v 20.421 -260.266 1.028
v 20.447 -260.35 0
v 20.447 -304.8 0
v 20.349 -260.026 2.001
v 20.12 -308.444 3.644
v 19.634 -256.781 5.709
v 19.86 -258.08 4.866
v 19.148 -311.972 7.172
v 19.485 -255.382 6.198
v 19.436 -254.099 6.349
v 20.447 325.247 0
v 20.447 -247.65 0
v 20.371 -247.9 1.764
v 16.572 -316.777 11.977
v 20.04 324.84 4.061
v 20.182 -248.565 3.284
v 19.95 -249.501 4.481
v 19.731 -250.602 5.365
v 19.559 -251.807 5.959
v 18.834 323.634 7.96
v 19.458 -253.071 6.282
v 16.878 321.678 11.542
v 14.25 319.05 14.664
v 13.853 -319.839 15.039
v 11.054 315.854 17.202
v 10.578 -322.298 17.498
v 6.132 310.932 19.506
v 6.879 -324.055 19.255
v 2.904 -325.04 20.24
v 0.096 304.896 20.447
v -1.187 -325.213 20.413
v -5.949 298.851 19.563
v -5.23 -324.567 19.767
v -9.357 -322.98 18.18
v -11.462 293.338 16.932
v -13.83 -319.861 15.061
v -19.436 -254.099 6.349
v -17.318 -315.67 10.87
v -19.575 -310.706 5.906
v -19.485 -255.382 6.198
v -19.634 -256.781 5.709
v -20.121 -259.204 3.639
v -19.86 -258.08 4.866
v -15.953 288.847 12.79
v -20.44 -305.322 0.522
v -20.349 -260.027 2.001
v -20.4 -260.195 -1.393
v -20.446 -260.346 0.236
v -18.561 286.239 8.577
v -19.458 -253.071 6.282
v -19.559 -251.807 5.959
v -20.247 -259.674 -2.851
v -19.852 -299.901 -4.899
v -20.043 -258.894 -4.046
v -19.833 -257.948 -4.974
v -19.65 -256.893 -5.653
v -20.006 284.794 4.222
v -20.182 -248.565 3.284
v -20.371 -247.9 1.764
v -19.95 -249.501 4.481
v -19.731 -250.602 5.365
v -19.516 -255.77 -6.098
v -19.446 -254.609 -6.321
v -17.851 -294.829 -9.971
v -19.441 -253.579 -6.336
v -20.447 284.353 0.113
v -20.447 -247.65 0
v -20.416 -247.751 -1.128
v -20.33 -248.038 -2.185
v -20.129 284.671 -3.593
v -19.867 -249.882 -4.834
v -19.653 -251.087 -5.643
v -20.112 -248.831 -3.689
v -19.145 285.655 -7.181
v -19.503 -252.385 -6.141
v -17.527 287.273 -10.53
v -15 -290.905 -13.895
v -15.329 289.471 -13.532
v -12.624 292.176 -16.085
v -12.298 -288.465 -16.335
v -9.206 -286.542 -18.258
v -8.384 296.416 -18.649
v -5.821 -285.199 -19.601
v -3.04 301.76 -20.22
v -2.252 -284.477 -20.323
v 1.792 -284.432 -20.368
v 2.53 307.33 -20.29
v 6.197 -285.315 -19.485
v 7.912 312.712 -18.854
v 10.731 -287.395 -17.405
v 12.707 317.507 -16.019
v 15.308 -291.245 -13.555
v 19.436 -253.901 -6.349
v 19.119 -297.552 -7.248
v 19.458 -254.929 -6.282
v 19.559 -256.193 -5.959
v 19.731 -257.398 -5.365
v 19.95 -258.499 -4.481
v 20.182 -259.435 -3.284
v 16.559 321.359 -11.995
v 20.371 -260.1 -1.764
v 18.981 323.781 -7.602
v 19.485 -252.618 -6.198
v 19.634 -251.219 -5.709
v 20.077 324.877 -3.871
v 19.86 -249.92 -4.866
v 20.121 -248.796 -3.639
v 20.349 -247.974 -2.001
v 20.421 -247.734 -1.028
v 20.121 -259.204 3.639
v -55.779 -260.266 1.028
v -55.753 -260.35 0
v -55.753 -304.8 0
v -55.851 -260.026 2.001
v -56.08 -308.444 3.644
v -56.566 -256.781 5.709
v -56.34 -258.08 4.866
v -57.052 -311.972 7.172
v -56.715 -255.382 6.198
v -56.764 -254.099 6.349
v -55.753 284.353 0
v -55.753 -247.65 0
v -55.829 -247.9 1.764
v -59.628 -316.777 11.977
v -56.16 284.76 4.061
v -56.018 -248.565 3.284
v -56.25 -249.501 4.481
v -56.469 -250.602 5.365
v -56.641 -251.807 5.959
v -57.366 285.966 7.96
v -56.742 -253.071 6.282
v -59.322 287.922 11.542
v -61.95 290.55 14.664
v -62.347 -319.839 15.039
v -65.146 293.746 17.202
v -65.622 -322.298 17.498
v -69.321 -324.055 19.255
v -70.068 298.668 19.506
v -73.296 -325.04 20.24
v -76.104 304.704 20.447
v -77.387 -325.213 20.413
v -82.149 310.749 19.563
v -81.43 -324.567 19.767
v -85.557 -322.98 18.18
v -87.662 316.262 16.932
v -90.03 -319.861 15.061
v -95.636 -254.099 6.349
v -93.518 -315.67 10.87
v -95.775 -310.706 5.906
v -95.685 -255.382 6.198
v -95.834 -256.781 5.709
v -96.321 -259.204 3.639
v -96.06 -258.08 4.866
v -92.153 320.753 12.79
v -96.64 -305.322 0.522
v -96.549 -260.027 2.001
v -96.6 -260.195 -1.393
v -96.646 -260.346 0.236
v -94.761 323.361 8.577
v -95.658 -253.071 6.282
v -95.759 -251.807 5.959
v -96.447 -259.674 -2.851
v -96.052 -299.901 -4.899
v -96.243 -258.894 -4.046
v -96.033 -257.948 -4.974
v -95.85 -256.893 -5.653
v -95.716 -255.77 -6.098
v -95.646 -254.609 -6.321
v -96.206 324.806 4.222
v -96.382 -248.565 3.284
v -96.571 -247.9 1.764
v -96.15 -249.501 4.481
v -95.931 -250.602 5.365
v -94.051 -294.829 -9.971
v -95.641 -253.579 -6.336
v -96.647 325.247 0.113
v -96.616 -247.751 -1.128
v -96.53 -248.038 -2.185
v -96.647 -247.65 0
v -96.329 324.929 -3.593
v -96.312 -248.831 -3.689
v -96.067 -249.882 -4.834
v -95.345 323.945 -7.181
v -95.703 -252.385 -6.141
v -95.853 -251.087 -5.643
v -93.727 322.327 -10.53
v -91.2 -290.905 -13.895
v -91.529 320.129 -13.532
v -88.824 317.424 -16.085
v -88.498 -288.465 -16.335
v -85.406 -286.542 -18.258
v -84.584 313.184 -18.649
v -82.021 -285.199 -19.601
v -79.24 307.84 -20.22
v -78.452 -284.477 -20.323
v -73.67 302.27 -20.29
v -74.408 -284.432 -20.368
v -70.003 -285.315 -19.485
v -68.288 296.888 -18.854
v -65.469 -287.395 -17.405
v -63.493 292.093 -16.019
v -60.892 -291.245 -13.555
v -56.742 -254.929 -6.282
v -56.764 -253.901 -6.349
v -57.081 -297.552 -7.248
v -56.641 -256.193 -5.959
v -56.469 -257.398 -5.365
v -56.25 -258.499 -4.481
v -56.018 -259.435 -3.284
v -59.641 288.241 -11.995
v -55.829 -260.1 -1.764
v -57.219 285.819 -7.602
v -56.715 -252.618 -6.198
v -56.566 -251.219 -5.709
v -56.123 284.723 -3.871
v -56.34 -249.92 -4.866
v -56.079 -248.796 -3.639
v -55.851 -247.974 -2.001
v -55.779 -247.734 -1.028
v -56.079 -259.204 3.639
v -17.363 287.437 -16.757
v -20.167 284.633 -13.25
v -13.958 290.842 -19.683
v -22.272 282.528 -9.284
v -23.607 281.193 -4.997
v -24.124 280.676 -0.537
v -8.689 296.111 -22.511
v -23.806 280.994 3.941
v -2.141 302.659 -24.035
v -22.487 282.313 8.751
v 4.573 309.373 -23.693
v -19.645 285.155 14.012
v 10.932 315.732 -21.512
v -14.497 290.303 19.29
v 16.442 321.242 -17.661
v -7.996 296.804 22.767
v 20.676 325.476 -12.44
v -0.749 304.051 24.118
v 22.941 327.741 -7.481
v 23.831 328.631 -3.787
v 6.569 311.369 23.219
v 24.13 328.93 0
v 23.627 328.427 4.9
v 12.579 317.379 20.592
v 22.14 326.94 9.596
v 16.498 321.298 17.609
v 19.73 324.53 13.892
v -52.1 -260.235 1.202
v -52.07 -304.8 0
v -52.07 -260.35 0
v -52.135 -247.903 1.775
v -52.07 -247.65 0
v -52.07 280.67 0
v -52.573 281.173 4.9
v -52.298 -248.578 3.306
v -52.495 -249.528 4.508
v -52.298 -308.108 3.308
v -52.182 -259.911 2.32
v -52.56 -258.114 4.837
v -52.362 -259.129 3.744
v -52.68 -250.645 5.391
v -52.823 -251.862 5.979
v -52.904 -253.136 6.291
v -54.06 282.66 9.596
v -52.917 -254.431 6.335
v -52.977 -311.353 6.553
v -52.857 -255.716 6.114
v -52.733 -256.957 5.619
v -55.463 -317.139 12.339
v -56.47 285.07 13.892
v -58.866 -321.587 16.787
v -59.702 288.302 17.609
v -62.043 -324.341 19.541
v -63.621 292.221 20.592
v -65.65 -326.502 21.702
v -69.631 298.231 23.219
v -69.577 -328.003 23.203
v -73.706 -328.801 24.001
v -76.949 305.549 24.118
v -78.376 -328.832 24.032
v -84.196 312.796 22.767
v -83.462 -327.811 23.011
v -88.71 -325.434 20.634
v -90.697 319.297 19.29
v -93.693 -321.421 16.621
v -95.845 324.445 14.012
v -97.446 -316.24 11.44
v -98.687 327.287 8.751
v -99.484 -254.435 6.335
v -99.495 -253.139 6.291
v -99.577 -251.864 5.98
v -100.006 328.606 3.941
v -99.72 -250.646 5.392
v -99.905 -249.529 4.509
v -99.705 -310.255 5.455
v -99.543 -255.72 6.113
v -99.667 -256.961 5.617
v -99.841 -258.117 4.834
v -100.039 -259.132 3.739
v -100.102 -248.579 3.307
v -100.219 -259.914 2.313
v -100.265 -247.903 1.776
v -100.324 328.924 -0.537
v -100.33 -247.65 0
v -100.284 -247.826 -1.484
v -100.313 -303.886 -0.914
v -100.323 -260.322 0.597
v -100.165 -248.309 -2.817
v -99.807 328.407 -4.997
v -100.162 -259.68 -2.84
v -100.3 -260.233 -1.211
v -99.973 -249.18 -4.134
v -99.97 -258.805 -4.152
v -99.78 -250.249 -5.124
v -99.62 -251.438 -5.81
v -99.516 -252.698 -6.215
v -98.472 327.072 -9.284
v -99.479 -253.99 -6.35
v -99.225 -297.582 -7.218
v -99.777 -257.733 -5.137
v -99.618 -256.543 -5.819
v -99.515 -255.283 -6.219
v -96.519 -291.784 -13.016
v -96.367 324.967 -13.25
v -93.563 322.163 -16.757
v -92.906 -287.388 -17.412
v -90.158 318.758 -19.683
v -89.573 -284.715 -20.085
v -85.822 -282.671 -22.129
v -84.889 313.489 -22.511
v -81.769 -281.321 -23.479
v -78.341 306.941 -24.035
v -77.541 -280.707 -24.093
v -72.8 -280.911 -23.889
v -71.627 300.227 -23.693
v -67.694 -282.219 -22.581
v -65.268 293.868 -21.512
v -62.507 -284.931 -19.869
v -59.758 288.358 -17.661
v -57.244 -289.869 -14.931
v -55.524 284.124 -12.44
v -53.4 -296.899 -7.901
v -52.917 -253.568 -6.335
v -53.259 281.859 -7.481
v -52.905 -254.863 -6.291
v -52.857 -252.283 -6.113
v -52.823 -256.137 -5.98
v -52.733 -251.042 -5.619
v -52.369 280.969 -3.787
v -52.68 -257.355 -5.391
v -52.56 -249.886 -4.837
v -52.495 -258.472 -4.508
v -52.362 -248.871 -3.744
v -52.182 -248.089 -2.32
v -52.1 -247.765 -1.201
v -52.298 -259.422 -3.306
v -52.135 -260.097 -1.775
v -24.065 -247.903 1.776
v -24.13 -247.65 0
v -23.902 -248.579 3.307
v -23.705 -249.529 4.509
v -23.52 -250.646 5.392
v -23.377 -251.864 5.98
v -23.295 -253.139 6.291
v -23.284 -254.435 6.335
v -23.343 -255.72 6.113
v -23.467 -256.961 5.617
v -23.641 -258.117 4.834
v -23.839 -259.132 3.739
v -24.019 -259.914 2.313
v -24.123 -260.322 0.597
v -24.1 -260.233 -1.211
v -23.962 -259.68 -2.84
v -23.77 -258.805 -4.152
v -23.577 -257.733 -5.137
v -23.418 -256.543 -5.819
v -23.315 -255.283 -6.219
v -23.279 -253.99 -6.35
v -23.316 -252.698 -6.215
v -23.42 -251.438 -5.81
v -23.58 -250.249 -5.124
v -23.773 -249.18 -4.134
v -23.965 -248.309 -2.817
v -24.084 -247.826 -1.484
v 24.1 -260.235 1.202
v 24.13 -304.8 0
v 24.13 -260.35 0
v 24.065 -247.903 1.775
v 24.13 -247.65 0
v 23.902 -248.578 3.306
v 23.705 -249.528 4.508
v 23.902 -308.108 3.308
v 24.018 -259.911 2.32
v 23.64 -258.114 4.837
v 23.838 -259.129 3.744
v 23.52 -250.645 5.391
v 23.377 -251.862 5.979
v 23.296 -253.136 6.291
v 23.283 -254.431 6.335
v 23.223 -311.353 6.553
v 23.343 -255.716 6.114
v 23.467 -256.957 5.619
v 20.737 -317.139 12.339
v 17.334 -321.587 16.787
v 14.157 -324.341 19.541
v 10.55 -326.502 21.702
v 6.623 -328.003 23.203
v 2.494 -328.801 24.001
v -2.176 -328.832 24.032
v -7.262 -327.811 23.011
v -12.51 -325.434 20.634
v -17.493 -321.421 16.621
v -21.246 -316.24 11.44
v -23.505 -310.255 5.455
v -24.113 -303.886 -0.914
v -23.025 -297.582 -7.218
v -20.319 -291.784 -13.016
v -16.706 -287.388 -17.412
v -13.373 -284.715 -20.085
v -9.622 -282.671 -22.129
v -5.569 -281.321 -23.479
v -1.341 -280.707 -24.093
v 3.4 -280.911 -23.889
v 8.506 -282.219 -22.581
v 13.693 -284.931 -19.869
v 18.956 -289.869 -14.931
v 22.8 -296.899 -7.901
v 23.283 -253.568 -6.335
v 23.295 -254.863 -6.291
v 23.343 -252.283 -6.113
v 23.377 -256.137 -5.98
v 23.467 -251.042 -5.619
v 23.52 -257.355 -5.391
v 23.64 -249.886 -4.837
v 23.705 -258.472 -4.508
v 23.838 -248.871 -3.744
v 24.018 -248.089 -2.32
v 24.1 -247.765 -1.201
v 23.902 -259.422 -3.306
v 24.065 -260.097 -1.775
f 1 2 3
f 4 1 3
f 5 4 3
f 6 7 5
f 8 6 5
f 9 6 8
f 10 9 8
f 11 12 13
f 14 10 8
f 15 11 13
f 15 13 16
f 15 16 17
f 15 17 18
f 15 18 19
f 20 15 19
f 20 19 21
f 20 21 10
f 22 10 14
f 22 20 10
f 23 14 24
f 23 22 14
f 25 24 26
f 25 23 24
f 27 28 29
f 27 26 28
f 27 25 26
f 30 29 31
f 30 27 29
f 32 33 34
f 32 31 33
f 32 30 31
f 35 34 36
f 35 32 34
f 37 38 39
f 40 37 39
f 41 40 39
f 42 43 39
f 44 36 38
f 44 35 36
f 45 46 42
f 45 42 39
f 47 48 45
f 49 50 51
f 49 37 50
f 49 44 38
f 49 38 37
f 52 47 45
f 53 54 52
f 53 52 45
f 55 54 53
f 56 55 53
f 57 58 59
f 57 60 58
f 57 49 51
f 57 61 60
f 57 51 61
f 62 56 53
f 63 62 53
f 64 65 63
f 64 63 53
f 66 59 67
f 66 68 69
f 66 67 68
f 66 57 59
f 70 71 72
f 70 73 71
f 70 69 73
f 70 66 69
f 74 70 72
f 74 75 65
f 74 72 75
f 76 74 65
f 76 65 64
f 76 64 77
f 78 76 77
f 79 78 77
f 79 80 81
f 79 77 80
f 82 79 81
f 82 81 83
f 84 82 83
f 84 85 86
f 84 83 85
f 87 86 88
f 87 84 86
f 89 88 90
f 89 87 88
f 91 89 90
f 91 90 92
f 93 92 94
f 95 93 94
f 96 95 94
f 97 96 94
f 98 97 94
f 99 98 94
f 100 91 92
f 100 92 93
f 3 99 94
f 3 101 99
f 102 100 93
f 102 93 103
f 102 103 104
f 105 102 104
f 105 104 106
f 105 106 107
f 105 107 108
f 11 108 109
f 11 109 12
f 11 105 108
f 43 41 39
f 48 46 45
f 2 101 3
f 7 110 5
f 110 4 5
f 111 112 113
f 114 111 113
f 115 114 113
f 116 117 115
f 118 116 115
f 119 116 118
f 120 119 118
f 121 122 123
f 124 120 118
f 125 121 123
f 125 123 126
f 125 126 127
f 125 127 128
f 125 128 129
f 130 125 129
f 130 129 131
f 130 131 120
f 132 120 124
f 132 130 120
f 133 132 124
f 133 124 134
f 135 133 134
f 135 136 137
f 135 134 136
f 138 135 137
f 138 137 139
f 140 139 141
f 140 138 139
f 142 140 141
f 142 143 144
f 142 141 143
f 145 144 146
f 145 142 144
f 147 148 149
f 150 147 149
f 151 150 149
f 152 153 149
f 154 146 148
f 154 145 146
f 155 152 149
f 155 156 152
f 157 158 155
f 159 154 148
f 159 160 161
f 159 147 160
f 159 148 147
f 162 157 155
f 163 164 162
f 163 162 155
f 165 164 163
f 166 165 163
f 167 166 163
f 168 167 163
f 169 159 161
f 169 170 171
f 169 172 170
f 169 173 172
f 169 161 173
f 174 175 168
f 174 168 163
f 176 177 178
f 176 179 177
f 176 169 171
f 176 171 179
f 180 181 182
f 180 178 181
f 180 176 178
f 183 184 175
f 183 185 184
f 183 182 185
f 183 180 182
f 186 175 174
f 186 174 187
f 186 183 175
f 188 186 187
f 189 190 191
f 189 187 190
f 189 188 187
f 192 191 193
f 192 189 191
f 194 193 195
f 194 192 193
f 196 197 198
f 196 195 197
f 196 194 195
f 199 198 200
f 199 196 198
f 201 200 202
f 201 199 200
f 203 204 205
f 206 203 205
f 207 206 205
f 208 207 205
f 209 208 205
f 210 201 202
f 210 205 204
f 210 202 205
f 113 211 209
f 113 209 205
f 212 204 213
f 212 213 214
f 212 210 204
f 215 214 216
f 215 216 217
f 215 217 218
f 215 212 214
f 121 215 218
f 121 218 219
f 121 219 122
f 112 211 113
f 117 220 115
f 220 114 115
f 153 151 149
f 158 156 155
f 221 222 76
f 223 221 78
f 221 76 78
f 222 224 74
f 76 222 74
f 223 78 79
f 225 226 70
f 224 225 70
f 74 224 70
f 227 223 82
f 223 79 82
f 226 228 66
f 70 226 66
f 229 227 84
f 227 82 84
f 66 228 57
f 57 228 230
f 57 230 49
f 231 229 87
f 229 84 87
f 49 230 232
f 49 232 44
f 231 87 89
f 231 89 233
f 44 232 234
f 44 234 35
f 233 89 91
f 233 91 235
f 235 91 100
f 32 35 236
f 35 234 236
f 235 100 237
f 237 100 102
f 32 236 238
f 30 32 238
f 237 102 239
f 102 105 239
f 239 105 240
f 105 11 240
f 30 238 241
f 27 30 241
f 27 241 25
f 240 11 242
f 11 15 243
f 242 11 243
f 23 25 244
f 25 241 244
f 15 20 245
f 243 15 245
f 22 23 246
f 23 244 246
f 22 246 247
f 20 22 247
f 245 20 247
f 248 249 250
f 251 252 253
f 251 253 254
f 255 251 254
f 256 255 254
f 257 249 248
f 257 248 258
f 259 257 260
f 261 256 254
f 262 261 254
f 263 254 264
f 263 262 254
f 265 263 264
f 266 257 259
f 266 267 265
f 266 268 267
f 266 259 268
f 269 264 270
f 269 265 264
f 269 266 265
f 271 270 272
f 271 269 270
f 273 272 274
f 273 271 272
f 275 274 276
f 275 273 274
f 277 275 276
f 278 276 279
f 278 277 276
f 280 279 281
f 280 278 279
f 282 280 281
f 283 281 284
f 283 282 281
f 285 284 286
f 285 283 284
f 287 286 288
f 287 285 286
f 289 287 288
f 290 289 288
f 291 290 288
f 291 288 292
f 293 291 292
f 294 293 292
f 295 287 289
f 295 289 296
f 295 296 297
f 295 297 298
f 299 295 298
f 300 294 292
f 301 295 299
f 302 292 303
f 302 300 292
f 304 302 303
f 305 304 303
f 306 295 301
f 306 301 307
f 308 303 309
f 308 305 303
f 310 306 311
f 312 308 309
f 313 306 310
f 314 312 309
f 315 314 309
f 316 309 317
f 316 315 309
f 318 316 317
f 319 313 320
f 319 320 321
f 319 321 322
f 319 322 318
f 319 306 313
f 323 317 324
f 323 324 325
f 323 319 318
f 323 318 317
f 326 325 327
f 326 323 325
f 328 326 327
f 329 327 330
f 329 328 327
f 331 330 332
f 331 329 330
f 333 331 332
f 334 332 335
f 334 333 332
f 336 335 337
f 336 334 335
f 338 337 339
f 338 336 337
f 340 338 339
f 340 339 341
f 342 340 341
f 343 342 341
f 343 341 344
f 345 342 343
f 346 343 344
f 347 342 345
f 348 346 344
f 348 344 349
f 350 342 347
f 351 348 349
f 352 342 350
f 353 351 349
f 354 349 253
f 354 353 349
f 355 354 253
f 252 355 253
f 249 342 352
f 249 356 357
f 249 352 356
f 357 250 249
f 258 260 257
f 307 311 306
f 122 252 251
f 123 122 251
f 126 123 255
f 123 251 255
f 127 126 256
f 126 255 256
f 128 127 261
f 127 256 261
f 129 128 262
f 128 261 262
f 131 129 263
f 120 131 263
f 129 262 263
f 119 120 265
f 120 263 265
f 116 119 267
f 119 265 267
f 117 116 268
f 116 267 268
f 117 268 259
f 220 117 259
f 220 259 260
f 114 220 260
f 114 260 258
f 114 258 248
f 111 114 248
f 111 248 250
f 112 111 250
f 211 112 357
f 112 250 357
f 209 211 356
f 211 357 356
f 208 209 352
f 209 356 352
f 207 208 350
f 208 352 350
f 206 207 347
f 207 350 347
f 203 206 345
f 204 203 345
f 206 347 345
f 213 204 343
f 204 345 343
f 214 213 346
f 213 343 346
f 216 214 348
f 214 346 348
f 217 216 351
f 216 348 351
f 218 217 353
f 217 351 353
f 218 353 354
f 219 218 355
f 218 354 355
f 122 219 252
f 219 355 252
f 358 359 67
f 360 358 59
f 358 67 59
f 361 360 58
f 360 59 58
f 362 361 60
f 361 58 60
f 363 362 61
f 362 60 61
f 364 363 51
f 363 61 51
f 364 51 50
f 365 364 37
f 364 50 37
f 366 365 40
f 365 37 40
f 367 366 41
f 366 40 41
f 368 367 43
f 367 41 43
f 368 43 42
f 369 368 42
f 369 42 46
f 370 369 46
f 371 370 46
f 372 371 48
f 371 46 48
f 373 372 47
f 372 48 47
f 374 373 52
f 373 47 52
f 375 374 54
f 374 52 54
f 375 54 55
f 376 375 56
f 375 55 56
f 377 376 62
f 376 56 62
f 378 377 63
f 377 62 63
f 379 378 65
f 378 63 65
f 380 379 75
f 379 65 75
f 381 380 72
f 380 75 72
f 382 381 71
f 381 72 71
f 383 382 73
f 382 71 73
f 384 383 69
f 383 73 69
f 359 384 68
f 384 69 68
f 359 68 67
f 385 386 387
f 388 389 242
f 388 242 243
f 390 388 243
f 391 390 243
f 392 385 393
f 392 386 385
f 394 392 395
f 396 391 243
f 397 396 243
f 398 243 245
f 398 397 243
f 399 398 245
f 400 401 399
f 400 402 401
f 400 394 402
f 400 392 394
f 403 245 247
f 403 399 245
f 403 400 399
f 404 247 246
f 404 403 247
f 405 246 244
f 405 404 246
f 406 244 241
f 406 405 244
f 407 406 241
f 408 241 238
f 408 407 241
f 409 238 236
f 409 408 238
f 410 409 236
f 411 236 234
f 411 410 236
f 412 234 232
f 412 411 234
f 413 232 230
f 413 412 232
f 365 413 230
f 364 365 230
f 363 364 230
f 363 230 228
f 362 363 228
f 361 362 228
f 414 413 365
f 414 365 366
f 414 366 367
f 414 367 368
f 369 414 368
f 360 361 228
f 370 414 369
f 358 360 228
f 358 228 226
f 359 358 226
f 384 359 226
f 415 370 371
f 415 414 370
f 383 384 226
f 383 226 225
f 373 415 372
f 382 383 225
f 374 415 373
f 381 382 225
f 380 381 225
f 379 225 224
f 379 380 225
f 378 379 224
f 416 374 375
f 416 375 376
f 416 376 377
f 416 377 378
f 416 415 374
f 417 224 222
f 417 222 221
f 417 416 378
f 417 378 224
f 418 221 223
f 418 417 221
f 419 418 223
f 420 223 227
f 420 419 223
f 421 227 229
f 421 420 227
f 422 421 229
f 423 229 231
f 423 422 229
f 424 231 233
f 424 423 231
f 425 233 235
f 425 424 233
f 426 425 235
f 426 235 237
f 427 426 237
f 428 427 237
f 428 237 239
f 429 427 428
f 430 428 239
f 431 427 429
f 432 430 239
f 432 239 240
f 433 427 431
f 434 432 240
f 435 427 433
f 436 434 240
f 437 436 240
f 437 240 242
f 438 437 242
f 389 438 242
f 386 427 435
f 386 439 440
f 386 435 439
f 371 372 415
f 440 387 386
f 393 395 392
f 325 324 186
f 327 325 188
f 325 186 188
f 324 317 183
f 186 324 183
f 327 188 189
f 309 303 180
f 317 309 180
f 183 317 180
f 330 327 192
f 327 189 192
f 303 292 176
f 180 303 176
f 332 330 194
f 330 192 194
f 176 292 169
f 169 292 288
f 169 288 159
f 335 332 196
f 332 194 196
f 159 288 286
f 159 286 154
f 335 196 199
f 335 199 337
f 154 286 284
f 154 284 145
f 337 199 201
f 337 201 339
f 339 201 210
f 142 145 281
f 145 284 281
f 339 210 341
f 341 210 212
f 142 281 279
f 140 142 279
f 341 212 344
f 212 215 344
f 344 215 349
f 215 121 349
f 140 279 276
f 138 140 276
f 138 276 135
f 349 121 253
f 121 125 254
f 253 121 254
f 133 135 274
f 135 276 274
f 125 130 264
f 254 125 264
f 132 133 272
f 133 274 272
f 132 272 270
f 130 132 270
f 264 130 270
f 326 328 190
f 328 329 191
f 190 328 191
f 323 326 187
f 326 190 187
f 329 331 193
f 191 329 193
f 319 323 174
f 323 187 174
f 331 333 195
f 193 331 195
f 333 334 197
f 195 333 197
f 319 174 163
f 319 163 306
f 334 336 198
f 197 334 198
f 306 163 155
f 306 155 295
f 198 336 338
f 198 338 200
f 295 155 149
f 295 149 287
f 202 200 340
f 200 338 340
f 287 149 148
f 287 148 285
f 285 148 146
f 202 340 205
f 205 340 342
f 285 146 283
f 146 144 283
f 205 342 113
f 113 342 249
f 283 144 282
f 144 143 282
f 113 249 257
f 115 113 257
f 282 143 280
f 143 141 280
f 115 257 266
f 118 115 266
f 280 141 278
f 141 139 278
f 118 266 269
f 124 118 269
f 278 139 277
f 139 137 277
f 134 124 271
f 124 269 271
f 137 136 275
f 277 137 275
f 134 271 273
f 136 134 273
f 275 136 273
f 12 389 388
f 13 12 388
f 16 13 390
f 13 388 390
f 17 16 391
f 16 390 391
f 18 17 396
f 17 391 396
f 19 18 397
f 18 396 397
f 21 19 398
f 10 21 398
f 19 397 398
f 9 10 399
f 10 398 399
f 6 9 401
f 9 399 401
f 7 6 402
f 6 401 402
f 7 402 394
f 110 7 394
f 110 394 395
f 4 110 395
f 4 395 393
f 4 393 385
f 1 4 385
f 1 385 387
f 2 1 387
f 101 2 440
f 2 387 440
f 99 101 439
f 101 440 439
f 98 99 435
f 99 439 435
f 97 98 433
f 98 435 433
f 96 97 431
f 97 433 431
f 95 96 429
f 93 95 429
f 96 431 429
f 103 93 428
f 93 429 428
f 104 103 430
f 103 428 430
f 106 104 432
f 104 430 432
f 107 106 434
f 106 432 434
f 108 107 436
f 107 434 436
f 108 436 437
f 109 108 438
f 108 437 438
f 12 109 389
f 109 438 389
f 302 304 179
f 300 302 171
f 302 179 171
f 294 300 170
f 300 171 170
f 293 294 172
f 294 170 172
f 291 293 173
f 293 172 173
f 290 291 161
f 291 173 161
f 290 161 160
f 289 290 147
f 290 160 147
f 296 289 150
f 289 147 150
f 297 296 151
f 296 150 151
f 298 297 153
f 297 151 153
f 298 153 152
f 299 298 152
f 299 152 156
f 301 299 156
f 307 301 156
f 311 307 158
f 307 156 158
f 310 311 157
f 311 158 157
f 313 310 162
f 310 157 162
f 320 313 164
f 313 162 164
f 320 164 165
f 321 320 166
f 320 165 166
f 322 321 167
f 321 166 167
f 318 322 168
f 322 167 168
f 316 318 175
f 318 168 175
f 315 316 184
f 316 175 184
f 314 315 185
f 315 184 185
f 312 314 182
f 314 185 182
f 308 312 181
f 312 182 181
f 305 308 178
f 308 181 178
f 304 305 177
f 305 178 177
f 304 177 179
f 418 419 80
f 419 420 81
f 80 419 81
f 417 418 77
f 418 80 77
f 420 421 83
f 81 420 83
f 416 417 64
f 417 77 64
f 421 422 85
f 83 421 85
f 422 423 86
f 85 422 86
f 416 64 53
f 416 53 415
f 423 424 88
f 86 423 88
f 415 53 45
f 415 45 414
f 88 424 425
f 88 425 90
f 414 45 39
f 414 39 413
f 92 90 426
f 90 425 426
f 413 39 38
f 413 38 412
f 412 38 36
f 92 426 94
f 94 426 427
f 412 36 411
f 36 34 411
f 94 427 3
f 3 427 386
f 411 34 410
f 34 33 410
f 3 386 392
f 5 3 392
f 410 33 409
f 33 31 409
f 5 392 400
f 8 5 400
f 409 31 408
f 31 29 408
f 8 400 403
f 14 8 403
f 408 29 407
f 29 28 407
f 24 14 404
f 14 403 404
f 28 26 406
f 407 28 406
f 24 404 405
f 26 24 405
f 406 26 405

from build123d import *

# Parameters (mm, degrees)
F0_R      = 24.13
F0_R_2    = 20.447
F1_DEPTH  = 355.6
F2_R      = 24.13
F2_R_2    = 20.447
F3_DEPTH  = 355.6
F5_DEPTH  = 152.4
F7_DEPTH  = 76.2
F9_DEPTH  = 76.2
F10_R     = 6.35
F11_DEPTH = 152.4


with BuildPart() as f1:
    # F0 (on Front) → F1 (new body, symmetric)
    with BuildSketch(Plane.XZ):
        Circle(F0_R)
        Circle(F0_R_2, mode=Mode.SUBTRACT)
    extrude(amount=F1_DEPTH, both=True)


with BuildPart() as f3:
    # F2 (on Front) → F3 (new body, symmetric)
    with BuildSketch(Plane.XZ):
        with Locations((-76.2, 0)):
            Circle(F2_R)
        with Locations((-76.2, 0)):
            Circle(F2_R_2, mode=Mode.SUBTRACT)
    extrude(amount=F3_DEPTH, both=True)


with BuildPart() as f5_tool:
    # F4 (on Right) → F5 (new body, symmetric)
    with BuildSketch(Plane.YZ):
        Polygon((-156.6048606801, -148.1951393199), (-304.8, 0), (-400.4833865581, 95.6833865581), (-522.7957103763, 95.6833865581), (-522.7957103763, -148.1951393199), align=None)
    extrude(amount=F5_DEPTH, both=True)


with BuildPart() as f1_1:
    add(f1.part)

    # F5: cut by f5_tool
    add(f5_tool.part, mode=Mode.SUBTRACT)

    # F6 (on Top) → F7 (cut, symmetric)
    with BuildSketch(Plane.XY):
        Polygon((-76.2, 228.6), (0, 304.8), (76.2, 381), (76.2, 508), (-76.2, 508), align=None)
    extrude(amount=F7_DEPTH, both=True, mode=Mode.SUBTRACT)


with BuildPart() as f3_1:
    add(f3.part)

    # F5: cut by f5_tool
    add(f5_tool.part, mode=Mode.SUBTRACT)

    # F8 (on Top) → F9 (cut, symmetric)
    with BuildSketch(Plane.XY):
        Polygon((-152.4, 381), (-76.2, 304.8), (0, 228.6), (0, 508), (-152.4, 508), align=None)
    extrude(amount=F9_DEPTH, both=True, mode=Mode.SUBTRACT)


with BuildPart() as f11_tool:
    # F10 (on Right) → F11 (new body, symmetric)
    with BuildSketch(Plane.YZ):
        with Locations((-254, 0)):
            Circle(F10_R)
    extrude(amount=F11_DEPTH, both=True)


with BuildPart() as f1_2:
    add(f1_1.part)

    # F11: cut by f11_tool
    add(f11_tool.part, mode=Mode.SUBTRACT)


with BuildPart() as f3_2:
    add(f3_1.part)

    # F11: cut by f11_tool
    add(f11_tool.part, mode=Mode.SUBTRACT)


solid = Compound([f1_2.part, f3_2.part])
